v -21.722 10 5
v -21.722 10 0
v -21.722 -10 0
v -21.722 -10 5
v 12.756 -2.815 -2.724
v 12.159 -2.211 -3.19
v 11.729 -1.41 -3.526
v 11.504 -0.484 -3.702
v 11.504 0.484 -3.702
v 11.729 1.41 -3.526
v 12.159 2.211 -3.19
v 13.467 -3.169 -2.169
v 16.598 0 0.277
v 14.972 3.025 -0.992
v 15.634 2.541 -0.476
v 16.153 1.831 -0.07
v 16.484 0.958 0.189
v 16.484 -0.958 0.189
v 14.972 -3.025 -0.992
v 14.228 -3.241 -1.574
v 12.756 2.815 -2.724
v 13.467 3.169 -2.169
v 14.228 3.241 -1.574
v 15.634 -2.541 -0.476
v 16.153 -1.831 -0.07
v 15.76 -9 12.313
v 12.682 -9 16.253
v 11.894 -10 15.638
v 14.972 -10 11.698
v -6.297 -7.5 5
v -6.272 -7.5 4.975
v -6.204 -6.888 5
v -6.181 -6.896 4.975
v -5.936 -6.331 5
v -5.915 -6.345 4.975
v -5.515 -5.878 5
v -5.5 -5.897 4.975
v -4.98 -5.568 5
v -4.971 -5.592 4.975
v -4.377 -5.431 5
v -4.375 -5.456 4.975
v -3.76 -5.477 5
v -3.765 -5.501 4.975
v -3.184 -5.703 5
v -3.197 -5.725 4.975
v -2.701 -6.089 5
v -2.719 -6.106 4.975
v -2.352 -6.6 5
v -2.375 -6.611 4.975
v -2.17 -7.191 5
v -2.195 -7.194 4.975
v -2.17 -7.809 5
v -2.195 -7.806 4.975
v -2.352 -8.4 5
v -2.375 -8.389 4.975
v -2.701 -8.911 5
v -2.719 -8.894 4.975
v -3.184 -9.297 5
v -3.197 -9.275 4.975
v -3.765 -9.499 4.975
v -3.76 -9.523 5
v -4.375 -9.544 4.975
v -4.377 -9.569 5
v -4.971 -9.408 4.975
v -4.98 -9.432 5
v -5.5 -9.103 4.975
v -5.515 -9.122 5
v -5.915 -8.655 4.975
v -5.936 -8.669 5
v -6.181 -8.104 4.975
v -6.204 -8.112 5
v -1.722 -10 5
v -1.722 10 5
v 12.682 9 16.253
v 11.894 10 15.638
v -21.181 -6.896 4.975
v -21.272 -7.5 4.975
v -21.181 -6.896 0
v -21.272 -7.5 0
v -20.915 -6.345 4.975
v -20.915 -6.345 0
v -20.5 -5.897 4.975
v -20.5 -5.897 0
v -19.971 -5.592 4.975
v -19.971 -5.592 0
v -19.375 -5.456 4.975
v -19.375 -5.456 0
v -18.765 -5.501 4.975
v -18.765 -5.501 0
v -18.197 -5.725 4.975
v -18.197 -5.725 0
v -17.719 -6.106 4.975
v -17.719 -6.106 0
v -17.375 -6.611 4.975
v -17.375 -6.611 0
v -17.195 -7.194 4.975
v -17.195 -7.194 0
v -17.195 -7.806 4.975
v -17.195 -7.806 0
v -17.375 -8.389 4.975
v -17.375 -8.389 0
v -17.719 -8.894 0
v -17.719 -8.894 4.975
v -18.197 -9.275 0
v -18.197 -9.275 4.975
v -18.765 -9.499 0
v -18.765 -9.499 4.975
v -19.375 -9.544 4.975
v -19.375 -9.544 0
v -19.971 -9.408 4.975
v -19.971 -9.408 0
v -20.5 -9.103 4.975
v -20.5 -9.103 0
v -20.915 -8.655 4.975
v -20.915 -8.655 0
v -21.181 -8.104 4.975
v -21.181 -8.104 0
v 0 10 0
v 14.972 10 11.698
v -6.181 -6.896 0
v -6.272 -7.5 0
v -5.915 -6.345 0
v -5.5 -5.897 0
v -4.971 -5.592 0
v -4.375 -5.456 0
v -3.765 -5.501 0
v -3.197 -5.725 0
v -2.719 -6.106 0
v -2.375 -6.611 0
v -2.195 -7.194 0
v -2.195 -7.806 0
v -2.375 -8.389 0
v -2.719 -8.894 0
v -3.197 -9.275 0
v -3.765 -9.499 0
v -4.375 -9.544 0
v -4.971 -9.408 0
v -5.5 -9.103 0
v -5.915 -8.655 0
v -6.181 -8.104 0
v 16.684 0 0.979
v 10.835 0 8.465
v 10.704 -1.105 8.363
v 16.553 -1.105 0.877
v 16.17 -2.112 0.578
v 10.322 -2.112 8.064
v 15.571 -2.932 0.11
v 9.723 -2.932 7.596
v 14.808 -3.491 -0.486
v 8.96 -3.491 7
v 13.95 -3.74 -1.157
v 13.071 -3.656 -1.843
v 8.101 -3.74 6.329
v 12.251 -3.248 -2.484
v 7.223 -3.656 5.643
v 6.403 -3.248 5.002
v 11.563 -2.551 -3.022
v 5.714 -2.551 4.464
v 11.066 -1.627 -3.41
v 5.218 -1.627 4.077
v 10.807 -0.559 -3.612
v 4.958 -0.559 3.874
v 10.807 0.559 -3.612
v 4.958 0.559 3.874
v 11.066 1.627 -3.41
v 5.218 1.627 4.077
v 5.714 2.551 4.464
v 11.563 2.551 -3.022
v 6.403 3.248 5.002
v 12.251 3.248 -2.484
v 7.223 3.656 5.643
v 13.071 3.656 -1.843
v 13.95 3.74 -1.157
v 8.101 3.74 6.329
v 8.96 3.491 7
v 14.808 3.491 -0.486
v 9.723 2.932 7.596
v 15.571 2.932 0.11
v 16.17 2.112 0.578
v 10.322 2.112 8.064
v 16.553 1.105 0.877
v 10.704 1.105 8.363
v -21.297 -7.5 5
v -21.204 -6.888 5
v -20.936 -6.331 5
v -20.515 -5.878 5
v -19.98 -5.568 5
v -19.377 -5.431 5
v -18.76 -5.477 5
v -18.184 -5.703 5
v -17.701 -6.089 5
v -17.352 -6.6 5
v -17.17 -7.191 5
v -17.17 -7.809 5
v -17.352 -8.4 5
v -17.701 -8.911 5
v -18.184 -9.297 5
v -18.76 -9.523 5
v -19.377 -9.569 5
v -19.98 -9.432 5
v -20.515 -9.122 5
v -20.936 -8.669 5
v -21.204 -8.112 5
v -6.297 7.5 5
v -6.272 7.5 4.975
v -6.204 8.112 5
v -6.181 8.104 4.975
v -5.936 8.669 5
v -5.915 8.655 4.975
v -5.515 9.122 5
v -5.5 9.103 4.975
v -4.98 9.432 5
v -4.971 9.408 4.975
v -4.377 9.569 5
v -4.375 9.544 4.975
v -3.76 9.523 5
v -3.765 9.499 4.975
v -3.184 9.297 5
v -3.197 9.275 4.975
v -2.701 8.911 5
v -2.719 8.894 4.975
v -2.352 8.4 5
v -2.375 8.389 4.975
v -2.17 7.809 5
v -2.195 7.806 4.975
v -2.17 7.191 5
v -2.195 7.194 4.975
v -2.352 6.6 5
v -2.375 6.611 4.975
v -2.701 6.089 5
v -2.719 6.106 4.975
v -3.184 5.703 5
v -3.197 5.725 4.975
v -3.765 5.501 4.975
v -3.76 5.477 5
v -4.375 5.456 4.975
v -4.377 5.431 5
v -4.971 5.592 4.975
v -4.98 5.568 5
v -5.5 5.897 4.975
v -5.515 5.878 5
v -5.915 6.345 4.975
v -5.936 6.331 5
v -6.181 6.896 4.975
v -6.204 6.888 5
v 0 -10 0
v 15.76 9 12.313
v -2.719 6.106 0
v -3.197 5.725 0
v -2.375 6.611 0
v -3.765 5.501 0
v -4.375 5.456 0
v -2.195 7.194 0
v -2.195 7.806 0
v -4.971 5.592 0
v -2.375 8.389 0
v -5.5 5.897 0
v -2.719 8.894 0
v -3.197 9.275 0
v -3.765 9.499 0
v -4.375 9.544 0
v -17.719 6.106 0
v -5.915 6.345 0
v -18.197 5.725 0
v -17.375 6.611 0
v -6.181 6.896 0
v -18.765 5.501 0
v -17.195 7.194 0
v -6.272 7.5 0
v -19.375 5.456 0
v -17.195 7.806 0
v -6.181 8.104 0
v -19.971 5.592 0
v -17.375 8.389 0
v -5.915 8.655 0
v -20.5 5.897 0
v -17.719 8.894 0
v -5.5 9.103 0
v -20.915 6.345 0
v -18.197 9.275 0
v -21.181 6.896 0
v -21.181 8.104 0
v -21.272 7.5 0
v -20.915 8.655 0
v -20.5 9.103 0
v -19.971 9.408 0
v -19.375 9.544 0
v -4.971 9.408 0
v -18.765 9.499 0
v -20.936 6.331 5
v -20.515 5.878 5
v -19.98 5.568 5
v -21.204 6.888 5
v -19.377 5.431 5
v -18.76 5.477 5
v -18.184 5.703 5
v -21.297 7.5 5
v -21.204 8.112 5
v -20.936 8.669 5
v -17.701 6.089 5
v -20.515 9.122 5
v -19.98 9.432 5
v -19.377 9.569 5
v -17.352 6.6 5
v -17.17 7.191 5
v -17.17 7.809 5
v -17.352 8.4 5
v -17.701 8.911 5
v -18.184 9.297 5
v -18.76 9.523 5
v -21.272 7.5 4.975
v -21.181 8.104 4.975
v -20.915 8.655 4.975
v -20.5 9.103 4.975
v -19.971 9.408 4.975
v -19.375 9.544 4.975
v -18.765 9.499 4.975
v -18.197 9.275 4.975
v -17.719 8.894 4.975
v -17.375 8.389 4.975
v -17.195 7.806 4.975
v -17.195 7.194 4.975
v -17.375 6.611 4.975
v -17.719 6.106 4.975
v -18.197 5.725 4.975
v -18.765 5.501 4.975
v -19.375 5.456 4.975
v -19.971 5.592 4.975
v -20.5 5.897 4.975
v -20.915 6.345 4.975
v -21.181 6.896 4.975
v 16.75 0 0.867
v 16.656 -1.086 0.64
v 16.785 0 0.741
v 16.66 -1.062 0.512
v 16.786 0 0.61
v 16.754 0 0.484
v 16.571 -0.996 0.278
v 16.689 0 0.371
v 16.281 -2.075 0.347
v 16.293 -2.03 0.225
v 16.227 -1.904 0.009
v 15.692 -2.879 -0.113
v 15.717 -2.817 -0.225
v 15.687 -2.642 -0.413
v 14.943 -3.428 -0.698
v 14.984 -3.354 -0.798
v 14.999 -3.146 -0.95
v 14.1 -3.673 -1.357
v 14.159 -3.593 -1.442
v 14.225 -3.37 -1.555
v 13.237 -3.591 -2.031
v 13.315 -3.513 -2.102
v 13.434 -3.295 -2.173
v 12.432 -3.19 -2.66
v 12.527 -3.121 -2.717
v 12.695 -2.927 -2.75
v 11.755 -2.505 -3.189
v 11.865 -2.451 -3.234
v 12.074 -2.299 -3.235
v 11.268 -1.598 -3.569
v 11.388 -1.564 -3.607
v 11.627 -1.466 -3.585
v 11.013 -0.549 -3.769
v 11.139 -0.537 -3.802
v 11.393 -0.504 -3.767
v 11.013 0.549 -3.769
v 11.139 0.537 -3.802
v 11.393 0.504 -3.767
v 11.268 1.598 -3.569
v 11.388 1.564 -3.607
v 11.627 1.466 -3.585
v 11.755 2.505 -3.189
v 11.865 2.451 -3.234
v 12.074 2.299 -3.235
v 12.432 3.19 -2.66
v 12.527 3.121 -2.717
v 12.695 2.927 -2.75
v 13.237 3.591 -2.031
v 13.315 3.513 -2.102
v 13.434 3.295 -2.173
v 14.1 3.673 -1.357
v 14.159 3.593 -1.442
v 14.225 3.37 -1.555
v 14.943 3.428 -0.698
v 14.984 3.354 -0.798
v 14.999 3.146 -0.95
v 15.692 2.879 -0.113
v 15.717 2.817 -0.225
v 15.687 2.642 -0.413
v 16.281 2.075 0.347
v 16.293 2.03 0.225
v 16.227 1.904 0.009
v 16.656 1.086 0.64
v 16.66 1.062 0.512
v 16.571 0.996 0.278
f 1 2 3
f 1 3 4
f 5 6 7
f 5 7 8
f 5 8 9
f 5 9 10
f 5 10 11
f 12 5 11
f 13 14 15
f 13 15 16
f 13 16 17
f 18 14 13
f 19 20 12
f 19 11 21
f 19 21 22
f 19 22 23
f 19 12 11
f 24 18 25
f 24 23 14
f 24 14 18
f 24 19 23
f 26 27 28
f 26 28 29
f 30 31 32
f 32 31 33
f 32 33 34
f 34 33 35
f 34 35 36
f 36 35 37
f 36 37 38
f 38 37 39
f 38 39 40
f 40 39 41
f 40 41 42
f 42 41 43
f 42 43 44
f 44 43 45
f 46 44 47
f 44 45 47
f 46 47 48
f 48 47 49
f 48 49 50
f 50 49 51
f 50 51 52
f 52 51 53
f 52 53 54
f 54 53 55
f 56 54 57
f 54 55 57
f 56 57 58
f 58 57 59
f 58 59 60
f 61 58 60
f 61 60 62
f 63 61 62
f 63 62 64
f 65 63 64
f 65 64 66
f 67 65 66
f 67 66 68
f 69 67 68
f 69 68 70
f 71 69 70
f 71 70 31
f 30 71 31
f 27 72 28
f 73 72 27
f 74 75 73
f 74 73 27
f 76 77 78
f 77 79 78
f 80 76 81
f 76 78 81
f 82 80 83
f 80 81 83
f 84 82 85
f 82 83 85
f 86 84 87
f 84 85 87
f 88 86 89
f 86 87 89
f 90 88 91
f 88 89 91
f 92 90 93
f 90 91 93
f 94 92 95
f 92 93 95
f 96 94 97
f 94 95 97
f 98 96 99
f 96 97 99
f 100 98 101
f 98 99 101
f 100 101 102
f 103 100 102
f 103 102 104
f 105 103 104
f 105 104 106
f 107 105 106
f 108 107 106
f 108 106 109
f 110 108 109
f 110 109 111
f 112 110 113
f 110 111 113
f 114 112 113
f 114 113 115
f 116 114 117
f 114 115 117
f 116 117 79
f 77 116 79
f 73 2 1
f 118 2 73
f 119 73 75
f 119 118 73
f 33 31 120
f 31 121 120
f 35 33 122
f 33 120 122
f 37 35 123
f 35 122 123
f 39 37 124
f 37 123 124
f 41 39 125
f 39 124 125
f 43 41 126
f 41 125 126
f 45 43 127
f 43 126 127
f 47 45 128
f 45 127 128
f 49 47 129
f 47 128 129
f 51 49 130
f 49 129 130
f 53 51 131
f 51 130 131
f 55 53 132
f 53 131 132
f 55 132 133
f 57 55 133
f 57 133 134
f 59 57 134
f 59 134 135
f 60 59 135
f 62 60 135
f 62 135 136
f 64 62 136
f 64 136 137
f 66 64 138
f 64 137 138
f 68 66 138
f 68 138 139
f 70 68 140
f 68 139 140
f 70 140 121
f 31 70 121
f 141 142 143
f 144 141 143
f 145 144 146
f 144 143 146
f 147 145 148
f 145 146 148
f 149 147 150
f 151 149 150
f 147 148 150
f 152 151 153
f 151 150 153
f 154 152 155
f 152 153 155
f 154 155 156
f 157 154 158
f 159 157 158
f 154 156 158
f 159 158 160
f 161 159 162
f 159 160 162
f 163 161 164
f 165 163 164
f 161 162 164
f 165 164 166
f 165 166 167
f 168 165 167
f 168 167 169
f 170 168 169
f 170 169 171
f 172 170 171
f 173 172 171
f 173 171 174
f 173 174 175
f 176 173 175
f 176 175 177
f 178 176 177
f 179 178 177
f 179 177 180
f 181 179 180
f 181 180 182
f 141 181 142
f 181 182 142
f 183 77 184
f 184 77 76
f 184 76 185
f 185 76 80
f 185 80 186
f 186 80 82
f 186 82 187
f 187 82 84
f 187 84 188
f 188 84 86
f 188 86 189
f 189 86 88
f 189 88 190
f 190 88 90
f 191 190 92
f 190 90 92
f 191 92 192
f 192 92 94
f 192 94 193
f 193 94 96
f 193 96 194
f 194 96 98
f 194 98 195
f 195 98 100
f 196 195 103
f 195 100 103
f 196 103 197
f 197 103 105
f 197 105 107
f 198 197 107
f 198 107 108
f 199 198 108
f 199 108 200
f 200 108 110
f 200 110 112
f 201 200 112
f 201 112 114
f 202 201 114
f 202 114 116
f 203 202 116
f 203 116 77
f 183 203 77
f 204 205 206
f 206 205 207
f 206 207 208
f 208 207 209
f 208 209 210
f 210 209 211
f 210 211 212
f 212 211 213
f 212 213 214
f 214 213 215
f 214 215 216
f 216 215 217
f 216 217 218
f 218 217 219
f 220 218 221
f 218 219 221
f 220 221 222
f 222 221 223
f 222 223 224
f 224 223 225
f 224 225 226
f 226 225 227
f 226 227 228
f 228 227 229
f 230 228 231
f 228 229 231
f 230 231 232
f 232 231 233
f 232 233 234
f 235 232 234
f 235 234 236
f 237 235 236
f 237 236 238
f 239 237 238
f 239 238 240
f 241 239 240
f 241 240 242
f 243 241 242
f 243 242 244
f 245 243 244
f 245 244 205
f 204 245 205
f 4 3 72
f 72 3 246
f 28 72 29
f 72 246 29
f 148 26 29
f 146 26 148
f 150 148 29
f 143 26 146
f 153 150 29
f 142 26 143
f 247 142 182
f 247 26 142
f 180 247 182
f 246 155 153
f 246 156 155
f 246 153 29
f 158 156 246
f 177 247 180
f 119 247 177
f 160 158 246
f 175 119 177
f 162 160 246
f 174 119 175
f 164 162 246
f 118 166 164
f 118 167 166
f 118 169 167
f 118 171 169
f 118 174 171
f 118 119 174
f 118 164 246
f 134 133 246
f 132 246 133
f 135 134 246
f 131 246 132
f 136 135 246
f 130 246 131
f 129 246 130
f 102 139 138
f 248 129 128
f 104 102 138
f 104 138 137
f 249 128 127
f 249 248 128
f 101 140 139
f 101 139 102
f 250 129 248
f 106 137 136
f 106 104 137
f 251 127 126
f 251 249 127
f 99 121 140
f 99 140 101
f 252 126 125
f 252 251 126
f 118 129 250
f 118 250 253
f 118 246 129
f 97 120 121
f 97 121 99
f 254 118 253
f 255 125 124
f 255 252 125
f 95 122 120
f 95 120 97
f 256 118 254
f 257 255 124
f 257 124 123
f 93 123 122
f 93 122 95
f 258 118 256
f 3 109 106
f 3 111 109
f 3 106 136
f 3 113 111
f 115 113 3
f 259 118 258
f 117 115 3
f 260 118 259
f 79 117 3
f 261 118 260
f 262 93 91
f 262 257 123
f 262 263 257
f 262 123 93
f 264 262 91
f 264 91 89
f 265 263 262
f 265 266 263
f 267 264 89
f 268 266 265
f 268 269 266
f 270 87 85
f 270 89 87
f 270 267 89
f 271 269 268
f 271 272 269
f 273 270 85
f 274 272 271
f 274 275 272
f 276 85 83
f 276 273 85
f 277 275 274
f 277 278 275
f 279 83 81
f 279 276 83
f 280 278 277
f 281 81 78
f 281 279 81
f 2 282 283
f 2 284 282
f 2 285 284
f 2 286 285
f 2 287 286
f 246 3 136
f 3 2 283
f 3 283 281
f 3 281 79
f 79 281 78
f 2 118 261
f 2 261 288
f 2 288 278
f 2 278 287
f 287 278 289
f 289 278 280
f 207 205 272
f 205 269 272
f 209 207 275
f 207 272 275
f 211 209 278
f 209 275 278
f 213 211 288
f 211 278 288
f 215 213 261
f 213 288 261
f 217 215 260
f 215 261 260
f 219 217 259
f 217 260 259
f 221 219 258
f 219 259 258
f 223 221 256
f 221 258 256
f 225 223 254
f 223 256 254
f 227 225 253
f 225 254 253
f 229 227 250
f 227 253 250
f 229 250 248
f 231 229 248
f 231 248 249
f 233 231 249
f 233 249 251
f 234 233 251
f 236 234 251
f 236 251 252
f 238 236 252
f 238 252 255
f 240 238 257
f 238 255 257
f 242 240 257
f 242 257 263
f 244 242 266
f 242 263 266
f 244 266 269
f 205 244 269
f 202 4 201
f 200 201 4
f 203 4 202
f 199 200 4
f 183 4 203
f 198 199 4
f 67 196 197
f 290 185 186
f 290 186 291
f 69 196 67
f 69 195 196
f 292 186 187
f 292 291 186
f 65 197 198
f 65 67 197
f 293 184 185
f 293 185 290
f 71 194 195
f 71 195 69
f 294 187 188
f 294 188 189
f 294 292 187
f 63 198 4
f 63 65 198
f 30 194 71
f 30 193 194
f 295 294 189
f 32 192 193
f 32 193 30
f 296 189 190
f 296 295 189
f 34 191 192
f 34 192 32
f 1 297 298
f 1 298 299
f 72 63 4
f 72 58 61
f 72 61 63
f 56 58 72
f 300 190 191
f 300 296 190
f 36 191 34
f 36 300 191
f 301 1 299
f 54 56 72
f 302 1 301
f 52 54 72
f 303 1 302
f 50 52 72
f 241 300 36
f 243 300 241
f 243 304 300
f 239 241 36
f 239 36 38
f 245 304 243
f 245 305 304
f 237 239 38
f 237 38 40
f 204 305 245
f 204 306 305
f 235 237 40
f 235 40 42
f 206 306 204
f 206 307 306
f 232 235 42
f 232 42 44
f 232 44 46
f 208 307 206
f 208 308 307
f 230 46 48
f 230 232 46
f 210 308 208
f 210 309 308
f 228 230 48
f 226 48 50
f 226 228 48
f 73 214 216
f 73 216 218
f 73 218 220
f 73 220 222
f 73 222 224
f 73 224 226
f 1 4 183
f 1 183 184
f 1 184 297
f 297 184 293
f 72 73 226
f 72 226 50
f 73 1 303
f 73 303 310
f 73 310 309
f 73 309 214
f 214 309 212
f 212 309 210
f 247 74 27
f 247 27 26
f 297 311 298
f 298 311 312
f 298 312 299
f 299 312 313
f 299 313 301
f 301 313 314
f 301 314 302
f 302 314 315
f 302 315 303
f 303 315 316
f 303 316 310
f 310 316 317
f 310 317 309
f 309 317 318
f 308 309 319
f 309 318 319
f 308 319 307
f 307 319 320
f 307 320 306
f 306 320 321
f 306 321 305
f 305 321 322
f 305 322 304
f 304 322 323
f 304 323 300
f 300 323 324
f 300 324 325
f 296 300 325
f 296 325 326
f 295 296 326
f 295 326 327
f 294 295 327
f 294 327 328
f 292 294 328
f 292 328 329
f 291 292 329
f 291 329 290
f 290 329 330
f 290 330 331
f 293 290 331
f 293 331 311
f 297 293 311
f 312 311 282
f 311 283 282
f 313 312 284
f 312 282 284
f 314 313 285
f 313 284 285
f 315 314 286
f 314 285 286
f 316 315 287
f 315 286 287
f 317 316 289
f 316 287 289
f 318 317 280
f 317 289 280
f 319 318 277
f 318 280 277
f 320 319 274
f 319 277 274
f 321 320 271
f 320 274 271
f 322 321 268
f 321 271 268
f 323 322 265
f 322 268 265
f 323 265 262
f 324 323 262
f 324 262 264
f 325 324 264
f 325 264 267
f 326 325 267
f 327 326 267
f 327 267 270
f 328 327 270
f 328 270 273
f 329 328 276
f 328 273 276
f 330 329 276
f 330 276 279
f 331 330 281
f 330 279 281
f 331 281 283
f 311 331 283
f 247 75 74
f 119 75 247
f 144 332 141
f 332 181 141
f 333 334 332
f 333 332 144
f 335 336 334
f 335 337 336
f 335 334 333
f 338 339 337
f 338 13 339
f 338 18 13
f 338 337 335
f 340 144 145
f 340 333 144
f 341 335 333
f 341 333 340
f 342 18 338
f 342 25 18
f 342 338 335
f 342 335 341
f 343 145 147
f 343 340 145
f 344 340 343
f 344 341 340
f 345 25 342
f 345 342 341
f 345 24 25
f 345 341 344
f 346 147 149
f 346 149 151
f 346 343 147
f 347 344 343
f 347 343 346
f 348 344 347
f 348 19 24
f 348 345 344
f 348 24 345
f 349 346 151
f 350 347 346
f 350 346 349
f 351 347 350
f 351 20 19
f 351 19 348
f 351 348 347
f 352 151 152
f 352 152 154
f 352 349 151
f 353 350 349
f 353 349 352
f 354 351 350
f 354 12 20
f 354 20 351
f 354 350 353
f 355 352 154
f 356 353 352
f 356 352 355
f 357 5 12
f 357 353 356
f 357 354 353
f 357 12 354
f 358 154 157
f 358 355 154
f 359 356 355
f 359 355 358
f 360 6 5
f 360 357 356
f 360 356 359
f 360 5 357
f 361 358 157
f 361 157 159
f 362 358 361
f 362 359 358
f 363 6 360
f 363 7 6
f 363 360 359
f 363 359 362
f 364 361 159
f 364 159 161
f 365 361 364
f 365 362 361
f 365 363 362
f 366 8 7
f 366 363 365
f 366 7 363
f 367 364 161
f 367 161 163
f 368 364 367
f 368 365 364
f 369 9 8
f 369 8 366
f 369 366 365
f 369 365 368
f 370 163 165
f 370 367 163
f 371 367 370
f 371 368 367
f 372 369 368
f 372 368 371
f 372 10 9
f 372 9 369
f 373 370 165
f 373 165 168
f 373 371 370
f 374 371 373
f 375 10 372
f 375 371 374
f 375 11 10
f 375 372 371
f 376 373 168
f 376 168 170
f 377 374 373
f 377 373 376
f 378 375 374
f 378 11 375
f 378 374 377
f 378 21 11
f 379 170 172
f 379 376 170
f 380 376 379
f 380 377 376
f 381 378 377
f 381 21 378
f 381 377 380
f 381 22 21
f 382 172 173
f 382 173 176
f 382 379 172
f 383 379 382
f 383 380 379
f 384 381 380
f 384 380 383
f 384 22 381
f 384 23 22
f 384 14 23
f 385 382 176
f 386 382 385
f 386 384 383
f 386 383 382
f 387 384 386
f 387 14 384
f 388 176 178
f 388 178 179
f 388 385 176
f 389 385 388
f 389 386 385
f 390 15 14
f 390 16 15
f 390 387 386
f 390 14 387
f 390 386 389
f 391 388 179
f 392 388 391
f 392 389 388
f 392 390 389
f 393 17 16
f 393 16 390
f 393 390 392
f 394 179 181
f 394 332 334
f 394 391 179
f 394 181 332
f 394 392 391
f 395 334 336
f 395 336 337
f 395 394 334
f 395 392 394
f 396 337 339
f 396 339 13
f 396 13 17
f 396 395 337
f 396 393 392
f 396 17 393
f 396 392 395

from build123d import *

# Parameters (mm, degrees)
EXTRUDE_1_DEPTH                   = 10
HOLE_WIZARD_4_1_4_1_1_D           = 4.1
HOLE_WIZARD_4_1_4_1_1_CSINK_D     = 4.15
HOLE_WIZARD_4_1_4_1_1_CSINK_ANGLE = 90
SKETCH_4_R                        = 3.75
EXTRUDE_2_DEPTH                   = 10
FILLET_1_R                        = 0.5
CHAMFER_1_SIZE                    = 1


with BuildPart() as part:
    # 草图1 → 凸台-拉伸1 (new, symmetric)
    with BuildSketch(Plane(origin=(0, 0, 0), x_dir=(1, 0, 0), z_dir=(0, 1, 0))):
        Polygon((0, 0), (-21.721638066, 0), (-21.721638066, -5), (-1.721638066, -5), (12.681907696, -16.253283275), (15.760215072, -12.313229507), align=None)
    extrude(amount=EXTRUDE_1_DEPTH, both=True)

    # Ø4.1 (4.1) 直径孔1 (through all)
    with Locations(Plane(origin=(-19.221638066, 7.5, 5), x_dir=(1, 0, 0), z_dir=(0, 0, 1))):
        with Locations((0, 0), (15, 0), (15, -15), (0, -15)):
            CounterSinkHole(HOLE_WIZARD_4_1_4_1_1_D / 2, HOLE_WIZARD_4_1_4_1_1_CSINK_D / 2, counter_sink_angle=HOLE_WIZARD_4_1_4_1_1_CSINK_ANGLE)

    # 草图4 → 凸台-拉伸2 (add)
    with BuildSketch(Plane(origin=(0, 0, 0), x_dir=(-0.7880107536067258, 0, -0.6156614753256534), z_dir=(0.6156614753256534, 0, -0.7880107536067258))):
        with Locations(Location((-10, 0, 0), (0, 0, 180))):
            Circle(SKETCH_4_R)
    extrude(amount=EXTRUDE_2_DEPTH)

    # 圆角1
    fillet_1_edges = [part.edges().sort_by_distance(p)[0] for p in [
        (11.081681963, 0, -4.032223315),
    ]]
    fillet(fillet_1_edges, radius=FILLET_1_R)

    # 倒角1
    chamfer_1_edges = [part.edges().sort_by_distance(p)[0] for p in [
        (14.221061384, 10, 14.283256391),
        (14.221061384, -10, 14.283256391),
    ]]
    chamfer(chamfer_1_edges, length=CHAMFER_1_SIZE)


solid = part.part
